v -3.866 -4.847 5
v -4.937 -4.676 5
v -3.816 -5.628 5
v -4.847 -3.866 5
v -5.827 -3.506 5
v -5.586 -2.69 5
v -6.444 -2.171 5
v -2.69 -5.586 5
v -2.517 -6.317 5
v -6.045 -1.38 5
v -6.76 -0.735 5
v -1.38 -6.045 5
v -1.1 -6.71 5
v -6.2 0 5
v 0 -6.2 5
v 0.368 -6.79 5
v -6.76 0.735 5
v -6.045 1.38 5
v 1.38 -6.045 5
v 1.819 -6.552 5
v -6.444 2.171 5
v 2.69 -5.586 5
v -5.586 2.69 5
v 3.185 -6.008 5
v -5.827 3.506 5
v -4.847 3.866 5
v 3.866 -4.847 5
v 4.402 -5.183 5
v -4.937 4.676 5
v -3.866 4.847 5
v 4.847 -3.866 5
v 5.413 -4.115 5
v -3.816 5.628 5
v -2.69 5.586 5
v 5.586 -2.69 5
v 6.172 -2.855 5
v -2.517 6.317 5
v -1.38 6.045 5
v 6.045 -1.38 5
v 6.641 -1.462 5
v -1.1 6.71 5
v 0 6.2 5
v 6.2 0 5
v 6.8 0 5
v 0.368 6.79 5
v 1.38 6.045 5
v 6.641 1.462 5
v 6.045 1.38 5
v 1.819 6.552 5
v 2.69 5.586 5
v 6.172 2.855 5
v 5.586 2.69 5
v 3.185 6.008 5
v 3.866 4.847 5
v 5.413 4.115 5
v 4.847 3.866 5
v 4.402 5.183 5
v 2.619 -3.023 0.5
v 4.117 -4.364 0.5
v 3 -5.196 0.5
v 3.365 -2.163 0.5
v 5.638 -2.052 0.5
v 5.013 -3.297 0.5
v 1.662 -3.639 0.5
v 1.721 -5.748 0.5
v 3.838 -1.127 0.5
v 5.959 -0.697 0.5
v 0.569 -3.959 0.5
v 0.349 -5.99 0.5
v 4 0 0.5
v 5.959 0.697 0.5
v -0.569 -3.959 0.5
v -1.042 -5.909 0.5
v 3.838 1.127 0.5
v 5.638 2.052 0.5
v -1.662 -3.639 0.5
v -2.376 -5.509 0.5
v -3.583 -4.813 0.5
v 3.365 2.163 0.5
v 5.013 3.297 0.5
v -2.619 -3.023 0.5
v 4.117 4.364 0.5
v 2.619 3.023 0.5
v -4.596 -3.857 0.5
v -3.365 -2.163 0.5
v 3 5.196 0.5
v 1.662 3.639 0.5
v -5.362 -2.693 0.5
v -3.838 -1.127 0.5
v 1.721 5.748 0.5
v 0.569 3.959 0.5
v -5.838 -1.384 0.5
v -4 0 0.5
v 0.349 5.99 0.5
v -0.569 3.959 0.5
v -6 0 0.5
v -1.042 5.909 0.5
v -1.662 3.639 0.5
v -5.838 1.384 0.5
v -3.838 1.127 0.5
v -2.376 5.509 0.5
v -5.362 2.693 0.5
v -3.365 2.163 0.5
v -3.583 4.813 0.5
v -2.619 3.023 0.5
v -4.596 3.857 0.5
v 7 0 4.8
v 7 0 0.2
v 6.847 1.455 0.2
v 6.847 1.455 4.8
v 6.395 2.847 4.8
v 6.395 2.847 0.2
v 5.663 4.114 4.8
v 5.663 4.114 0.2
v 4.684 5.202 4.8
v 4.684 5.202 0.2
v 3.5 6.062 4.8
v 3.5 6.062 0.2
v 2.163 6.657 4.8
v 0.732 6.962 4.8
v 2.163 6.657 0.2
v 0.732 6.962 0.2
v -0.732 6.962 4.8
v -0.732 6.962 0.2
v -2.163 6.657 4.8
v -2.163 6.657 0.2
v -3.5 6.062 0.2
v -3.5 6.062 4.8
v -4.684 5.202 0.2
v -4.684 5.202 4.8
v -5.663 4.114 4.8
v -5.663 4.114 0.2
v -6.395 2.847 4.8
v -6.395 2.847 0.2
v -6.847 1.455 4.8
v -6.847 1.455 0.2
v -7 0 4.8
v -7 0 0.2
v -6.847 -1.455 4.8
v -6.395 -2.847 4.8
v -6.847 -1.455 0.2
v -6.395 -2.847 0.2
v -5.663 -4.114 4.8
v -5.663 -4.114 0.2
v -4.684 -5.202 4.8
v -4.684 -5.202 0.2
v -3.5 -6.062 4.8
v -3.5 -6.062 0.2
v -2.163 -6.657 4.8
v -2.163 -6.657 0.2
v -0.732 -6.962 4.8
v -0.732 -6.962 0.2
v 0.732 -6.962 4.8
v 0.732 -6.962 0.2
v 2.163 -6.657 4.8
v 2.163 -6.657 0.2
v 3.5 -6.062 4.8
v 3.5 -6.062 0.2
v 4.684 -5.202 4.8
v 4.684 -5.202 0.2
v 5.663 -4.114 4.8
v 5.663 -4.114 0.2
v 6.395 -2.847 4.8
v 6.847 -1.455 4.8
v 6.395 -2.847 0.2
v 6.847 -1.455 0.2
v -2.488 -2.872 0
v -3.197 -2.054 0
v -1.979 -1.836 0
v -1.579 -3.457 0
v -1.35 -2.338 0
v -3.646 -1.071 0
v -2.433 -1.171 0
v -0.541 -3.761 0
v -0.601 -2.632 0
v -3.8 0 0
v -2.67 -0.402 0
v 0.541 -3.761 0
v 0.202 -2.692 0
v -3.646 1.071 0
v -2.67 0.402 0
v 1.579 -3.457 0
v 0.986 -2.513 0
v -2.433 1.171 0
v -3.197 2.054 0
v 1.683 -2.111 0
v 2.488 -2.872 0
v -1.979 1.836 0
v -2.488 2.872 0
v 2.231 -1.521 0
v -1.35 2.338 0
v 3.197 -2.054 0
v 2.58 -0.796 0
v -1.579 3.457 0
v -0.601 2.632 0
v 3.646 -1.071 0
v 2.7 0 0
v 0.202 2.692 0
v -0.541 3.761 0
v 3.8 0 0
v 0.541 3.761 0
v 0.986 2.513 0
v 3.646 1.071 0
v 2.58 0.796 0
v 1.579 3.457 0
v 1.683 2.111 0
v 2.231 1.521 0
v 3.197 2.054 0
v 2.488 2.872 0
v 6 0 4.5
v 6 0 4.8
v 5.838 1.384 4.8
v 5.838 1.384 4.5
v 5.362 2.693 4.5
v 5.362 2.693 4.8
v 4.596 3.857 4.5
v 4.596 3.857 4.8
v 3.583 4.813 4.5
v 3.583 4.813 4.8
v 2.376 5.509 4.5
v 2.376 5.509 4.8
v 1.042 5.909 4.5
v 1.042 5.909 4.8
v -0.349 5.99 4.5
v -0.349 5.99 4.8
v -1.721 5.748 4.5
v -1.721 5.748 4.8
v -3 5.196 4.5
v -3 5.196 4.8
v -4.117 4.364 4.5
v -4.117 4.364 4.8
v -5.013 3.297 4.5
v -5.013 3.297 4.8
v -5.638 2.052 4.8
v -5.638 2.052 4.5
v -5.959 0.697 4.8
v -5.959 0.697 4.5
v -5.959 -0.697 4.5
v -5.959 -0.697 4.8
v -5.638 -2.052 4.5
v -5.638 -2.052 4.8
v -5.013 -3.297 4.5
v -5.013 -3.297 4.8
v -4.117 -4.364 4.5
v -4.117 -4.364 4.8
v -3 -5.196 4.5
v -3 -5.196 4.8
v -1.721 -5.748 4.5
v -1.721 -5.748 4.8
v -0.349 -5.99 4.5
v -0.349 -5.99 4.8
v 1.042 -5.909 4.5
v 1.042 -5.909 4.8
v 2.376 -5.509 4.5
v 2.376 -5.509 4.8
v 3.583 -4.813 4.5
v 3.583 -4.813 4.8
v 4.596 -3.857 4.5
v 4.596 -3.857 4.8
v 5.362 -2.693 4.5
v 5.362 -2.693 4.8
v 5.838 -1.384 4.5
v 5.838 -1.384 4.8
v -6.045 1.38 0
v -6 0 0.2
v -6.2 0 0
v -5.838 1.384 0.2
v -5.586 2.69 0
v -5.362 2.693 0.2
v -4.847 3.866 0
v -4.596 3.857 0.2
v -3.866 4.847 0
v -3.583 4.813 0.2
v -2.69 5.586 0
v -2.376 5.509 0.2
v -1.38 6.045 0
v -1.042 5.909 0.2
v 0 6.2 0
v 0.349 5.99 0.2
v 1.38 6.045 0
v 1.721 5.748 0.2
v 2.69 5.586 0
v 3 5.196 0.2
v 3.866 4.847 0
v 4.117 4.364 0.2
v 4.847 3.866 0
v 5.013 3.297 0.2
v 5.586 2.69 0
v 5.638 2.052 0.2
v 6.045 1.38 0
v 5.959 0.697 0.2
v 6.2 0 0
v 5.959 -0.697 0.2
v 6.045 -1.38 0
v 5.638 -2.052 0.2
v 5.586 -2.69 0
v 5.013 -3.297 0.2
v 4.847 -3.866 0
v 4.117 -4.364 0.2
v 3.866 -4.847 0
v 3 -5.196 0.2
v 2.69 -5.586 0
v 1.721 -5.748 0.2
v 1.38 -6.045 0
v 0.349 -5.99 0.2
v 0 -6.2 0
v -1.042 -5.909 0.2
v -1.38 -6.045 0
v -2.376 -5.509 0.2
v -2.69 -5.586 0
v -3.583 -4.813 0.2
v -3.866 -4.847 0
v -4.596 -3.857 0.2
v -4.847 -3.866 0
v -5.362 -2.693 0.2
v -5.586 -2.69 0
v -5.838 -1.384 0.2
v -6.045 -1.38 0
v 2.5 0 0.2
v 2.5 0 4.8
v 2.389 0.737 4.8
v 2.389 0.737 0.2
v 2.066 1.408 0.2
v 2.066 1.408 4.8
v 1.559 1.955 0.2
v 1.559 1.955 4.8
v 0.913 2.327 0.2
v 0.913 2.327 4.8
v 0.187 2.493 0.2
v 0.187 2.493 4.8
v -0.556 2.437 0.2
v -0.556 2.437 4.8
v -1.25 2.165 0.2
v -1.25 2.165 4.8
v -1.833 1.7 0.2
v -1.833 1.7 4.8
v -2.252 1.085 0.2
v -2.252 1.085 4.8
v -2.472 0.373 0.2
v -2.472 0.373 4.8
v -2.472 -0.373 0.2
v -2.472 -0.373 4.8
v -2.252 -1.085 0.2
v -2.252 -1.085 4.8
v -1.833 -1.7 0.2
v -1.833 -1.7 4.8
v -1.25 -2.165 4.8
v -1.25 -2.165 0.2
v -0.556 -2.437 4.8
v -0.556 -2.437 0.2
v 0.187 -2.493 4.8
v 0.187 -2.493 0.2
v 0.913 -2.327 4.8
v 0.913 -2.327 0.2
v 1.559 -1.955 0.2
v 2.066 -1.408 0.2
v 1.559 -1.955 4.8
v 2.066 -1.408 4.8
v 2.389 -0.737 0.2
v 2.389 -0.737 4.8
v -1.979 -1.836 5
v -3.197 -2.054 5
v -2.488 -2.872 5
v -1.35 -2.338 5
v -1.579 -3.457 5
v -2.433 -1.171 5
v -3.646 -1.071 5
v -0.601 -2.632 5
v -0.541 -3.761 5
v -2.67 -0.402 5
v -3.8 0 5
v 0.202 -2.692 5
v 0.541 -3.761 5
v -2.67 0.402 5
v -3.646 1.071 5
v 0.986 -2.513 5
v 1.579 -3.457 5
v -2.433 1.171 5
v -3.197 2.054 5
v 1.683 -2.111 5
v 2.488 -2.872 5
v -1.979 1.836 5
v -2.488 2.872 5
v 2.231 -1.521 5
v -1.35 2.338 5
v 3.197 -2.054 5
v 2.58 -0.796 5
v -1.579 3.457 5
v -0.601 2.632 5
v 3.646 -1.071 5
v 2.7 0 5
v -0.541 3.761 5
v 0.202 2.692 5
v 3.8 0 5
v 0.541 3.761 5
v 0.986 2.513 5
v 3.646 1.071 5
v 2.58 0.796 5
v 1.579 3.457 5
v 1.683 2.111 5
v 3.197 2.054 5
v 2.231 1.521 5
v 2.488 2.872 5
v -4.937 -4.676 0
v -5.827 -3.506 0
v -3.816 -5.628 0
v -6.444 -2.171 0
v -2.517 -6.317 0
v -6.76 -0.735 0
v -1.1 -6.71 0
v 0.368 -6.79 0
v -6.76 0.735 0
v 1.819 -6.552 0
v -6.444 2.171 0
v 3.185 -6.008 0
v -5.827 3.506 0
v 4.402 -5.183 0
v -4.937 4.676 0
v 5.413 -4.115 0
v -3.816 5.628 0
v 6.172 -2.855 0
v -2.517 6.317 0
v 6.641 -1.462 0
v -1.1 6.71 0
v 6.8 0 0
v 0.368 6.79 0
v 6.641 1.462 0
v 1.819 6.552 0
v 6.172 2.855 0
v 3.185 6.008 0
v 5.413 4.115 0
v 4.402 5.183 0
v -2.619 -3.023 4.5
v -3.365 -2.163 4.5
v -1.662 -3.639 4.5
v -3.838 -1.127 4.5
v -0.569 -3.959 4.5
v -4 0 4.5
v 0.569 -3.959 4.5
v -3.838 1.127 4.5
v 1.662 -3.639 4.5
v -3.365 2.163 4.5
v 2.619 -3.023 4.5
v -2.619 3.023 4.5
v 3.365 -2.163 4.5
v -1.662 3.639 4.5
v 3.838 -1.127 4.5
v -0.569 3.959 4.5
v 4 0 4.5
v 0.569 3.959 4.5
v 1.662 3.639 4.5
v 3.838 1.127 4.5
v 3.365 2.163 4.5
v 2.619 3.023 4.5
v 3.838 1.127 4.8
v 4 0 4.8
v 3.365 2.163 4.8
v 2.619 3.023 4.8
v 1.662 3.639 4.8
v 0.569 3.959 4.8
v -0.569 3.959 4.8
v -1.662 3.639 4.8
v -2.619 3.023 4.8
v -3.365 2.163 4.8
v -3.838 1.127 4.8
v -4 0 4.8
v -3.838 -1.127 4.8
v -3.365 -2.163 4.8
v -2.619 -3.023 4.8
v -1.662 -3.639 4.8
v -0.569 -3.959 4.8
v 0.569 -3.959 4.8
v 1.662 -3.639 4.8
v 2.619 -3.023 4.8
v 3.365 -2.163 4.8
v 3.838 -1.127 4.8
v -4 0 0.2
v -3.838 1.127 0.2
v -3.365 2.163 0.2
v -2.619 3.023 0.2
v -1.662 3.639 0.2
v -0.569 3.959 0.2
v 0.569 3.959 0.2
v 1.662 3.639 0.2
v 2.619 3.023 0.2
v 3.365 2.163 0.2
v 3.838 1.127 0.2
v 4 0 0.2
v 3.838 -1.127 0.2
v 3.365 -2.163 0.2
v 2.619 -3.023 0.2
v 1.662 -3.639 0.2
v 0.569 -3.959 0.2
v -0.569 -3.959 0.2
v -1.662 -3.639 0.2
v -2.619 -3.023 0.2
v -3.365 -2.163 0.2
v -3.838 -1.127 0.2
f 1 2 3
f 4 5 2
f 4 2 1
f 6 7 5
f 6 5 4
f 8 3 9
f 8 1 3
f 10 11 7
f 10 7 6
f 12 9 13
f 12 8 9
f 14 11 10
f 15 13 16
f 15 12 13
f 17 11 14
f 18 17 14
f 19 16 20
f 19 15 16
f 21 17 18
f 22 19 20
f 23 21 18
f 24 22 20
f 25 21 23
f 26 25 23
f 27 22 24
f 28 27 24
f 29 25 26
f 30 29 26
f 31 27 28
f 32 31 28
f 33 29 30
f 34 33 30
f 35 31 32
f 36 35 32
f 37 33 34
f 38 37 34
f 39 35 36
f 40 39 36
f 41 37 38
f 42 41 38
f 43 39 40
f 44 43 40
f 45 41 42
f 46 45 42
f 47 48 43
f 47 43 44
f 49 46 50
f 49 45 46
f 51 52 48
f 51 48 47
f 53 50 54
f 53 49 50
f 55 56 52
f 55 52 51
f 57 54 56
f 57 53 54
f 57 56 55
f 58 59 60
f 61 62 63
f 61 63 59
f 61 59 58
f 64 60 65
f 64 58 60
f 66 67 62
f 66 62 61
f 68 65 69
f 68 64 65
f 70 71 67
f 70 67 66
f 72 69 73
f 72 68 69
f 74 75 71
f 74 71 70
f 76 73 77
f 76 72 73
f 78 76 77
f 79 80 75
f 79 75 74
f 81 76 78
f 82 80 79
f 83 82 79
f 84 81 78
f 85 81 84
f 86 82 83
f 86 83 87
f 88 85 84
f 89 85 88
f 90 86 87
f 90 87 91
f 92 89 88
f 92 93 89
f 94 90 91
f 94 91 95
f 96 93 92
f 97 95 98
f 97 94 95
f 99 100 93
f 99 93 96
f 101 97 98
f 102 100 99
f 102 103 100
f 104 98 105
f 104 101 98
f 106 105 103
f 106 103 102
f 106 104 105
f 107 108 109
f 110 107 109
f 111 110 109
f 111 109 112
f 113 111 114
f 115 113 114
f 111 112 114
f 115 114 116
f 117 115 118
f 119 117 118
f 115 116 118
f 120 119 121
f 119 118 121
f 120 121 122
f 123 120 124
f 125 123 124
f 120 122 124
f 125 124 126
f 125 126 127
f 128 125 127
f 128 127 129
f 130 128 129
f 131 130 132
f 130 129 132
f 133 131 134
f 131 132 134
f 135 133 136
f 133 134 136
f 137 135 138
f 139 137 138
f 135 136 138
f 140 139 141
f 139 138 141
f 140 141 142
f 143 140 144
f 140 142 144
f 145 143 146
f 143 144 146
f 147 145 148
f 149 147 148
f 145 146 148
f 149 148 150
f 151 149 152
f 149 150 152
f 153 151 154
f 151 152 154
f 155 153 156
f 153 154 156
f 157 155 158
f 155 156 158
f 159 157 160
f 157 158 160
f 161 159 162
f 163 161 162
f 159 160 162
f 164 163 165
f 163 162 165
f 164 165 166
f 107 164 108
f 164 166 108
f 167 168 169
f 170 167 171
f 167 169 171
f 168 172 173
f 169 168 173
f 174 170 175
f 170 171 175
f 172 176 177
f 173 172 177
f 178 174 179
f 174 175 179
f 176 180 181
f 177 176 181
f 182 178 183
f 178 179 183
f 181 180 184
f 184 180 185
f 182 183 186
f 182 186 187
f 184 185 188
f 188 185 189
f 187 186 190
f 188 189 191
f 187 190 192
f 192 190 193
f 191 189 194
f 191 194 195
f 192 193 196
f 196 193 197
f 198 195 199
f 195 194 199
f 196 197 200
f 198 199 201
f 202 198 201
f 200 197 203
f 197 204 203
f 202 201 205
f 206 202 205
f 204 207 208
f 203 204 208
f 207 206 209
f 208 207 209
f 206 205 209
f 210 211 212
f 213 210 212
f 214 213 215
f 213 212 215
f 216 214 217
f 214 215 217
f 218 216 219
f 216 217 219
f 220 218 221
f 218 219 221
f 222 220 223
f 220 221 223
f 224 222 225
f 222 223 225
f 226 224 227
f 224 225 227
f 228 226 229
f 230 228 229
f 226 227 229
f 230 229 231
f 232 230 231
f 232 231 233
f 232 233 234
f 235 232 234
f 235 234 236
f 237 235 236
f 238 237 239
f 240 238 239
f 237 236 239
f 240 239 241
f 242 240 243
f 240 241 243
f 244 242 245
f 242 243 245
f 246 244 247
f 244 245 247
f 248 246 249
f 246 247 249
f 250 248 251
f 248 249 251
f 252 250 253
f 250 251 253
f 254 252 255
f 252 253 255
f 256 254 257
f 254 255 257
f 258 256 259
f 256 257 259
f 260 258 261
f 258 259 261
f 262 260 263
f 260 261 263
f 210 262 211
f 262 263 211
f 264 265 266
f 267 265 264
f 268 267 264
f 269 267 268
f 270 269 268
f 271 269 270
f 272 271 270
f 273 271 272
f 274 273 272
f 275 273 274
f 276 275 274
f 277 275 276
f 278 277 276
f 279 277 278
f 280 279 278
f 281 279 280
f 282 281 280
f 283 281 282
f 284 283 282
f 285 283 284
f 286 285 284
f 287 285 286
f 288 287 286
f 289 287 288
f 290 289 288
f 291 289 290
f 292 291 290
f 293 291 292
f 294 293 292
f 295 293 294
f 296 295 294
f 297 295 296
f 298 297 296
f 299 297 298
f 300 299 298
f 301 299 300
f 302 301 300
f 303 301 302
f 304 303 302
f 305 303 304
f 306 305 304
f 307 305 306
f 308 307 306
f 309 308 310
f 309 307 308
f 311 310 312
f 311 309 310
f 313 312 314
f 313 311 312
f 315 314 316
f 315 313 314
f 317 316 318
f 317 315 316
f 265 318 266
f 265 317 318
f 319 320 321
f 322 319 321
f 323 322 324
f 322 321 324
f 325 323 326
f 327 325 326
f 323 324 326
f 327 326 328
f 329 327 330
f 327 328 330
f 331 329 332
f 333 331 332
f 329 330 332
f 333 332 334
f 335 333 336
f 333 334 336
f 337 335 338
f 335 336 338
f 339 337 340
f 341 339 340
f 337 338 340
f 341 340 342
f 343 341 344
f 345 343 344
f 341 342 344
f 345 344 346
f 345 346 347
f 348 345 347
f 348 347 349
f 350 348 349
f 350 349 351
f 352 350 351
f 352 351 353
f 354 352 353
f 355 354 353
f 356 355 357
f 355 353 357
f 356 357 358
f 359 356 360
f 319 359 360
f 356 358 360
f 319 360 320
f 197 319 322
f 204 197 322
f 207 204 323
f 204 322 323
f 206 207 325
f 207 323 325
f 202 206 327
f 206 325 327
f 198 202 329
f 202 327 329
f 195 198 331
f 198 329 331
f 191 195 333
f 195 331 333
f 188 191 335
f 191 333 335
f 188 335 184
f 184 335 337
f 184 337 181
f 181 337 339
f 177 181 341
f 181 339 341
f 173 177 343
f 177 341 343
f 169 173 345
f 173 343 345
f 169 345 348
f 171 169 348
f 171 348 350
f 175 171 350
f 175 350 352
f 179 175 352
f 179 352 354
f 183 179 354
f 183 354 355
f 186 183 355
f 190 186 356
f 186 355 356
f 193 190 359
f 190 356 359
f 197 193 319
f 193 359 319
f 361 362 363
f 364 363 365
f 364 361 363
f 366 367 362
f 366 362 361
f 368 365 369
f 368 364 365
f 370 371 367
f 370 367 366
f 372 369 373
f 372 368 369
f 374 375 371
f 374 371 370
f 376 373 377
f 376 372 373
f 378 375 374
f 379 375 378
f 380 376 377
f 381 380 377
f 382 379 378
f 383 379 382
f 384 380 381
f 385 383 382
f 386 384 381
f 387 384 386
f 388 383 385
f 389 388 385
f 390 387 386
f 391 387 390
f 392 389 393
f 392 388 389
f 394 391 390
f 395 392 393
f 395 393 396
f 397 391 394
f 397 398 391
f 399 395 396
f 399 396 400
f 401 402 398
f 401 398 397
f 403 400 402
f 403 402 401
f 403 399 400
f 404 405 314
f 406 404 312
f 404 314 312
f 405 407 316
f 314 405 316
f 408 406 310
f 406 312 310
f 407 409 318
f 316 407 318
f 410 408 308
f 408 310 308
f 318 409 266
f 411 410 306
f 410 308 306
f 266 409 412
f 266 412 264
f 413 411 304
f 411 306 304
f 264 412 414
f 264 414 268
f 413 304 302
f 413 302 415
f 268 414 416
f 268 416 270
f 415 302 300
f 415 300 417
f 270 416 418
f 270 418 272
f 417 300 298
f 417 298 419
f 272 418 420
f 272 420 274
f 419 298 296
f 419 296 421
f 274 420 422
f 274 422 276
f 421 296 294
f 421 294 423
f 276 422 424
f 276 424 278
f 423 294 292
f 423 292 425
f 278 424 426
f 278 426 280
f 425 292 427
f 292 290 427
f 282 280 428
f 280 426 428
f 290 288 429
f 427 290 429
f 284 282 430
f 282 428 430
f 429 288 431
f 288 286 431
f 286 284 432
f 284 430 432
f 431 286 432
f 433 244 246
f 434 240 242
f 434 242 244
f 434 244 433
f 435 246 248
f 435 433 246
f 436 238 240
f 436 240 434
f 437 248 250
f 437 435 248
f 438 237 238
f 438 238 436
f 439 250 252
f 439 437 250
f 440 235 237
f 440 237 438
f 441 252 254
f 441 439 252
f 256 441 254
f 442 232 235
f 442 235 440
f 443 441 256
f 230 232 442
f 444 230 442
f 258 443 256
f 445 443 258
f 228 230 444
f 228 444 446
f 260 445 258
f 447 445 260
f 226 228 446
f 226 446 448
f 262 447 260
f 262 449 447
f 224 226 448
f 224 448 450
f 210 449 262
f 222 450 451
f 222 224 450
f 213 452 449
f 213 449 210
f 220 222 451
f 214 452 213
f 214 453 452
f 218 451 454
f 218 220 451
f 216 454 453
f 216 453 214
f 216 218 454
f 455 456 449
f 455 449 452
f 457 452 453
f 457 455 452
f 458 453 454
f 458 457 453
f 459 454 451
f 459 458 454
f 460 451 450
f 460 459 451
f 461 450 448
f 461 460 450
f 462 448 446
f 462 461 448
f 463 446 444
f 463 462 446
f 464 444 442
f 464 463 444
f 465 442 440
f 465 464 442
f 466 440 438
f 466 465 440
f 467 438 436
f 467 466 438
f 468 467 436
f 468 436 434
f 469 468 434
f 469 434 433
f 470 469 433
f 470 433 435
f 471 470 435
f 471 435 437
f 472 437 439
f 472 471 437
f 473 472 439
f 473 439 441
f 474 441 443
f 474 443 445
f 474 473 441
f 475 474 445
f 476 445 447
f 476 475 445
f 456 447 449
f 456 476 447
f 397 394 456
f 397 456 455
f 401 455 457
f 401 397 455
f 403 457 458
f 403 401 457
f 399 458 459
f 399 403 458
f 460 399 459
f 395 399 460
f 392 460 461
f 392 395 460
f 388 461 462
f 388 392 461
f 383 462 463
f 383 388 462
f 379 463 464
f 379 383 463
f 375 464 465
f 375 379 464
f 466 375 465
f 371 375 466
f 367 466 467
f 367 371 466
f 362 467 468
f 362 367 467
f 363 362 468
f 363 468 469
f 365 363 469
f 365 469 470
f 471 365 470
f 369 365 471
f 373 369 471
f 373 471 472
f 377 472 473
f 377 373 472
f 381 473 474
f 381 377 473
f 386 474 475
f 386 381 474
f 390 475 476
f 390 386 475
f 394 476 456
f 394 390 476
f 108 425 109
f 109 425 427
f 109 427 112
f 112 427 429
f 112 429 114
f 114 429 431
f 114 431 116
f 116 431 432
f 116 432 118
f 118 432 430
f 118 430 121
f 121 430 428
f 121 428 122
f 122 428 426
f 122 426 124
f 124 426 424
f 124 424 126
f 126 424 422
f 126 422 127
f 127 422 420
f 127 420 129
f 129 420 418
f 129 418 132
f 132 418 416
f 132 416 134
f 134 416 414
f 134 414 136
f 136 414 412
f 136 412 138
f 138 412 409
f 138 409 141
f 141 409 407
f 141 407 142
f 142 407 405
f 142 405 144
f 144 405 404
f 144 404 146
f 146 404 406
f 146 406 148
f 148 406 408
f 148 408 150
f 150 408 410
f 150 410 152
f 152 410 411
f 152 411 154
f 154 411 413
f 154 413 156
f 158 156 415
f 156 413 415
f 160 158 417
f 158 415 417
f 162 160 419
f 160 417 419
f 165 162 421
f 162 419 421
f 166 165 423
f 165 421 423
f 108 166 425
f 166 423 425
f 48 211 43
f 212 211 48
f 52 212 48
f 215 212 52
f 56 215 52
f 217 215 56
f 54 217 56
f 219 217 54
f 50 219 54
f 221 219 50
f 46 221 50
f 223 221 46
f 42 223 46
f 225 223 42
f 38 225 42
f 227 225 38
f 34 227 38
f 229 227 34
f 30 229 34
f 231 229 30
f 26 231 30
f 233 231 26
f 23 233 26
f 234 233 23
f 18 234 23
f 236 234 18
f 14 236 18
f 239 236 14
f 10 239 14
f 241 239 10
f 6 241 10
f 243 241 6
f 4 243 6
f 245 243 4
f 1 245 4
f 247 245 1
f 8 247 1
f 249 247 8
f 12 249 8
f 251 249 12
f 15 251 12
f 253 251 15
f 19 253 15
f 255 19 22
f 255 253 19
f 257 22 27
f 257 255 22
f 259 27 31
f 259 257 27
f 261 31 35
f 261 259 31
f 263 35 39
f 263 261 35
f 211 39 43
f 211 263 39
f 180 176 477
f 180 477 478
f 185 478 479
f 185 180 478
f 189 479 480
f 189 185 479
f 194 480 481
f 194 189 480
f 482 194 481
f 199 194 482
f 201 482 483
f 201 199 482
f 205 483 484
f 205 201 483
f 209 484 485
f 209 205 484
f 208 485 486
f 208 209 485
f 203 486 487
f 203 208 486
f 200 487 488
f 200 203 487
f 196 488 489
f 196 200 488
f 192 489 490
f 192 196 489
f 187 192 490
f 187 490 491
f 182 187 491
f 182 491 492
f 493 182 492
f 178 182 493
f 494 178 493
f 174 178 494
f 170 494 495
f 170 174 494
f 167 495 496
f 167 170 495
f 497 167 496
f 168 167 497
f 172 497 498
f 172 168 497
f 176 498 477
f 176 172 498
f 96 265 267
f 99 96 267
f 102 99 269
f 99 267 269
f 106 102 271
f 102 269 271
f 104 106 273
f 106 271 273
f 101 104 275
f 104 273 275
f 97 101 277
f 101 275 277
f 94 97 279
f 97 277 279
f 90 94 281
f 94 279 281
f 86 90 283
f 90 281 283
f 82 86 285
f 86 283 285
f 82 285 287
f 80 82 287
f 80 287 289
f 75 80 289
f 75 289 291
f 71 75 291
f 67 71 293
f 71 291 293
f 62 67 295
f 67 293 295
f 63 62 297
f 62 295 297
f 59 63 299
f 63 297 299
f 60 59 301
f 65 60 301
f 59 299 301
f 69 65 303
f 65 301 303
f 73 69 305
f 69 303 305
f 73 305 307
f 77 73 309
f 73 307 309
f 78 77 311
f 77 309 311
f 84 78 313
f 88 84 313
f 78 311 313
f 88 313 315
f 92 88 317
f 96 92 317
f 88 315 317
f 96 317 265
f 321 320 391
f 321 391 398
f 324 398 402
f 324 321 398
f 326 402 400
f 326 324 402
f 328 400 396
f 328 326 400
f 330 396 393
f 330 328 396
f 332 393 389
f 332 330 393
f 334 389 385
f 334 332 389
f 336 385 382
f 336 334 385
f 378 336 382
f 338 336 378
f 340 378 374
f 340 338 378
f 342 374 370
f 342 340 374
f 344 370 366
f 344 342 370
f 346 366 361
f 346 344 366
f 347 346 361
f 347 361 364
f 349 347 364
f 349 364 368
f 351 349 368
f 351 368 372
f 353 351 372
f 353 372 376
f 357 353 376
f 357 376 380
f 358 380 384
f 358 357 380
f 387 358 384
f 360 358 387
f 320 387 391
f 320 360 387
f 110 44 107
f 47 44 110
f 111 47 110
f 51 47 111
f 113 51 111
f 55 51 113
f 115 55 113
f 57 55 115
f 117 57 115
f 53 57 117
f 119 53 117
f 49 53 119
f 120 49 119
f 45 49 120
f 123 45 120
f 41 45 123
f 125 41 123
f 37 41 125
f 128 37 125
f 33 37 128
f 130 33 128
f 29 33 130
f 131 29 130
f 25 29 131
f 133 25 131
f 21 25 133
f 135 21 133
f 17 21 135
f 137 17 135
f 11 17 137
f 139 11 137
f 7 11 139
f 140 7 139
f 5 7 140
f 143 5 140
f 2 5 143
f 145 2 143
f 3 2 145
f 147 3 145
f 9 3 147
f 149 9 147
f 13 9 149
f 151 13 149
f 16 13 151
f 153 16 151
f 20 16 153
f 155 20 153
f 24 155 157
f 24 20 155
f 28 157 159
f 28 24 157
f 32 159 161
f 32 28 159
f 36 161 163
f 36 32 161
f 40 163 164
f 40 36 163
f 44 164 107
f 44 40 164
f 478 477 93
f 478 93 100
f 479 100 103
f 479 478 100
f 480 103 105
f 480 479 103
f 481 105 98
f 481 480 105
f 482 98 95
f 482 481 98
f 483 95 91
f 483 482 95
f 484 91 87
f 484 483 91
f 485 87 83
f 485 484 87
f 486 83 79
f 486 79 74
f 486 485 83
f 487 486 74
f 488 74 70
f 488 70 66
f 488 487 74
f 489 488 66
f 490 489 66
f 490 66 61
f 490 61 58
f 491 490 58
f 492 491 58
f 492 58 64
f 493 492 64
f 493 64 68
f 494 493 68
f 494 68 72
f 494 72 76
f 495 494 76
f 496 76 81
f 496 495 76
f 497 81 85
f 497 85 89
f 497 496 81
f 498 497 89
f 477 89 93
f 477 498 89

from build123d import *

# Parameters (mm, degrees)
CROQUIS1_R              = 7
SALIENTE_EXTRUIR1_DEPTH = 5
CROQUIS2_R              = 2.5
CORTAR_EXTRUIR1_DEPTH   = 5
CROQUIS3_R              = 6
CROQUIS3_R_2            = 4
CORTAR_EXTRUIR3_DEPTH   = 0.5
CROQUIS4_R              = 6
CROQUIS4_R_2            = 4
CORTAR_EXTRUIR4_DEPTH   = 0.5
CHAFL_N1_SIZE           = 0.2


with BuildPart() as part:
    # Croquis1 → Saliente-Extruir1 (new body)
    with BuildSketch(Plane.XY):
        Circle(CROQUIS1_R)
    extrude(amount=SALIENTE_EXTRUIR1_DEPTH)

    # Croquis2 → Cortar-Extruir1 (cut)
    with BuildSketch(Plane.XY.offset(5)):
        Circle(CROQUIS2_R)
    extrude(amount=-CORTAR_EXTRUIR1_DEPTH, mode=Mode.SUBTRACT)

    # Croquis3 → Cortar-Extruir3 (cut)
    with BuildSketch(Plane.XY.offset(5)):
        Circle(CROQUIS3_R)
        Circle(CROQUIS3_R_2, mode=Mode.SUBTRACT)
    extrude(amount=-CORTAR_EXTRUIR3_DEPTH, mode=Mode.SUBTRACT)

    # Croquis4 → Cortar-Extruir4 (cut)
    with BuildSketch(Plane(origin=(0, 0, 0), x_dir=(-1, 0, 0), z_dir=(0, 0, -1))):
        Circle(CROQUIS4_R)
        Circle(CROQUIS4_R_2, mode=Mode.SUBTRACT)
    extrude(amount=-CORTAR_EXTRUIR4_DEPTH, mode=Mode.SUBTRACT)

    # Chaflán1
    chafl_n1_edges = [part.edges().sort_by_distance(p)[0] for p in [
        (-6, 0, 5),
        (-4, 0, 5),
        (-7, 0, 0),
        (6, 0, 0),
        (4, 0, 0),
        (-7, 0, 5),
        (-2.5, 0, 0),
        (-2.5, 0, 5),
    ]]
    chamfer(chafl_n1_edges, length=CHAFL_N1_SIZE)


solid = part.part
